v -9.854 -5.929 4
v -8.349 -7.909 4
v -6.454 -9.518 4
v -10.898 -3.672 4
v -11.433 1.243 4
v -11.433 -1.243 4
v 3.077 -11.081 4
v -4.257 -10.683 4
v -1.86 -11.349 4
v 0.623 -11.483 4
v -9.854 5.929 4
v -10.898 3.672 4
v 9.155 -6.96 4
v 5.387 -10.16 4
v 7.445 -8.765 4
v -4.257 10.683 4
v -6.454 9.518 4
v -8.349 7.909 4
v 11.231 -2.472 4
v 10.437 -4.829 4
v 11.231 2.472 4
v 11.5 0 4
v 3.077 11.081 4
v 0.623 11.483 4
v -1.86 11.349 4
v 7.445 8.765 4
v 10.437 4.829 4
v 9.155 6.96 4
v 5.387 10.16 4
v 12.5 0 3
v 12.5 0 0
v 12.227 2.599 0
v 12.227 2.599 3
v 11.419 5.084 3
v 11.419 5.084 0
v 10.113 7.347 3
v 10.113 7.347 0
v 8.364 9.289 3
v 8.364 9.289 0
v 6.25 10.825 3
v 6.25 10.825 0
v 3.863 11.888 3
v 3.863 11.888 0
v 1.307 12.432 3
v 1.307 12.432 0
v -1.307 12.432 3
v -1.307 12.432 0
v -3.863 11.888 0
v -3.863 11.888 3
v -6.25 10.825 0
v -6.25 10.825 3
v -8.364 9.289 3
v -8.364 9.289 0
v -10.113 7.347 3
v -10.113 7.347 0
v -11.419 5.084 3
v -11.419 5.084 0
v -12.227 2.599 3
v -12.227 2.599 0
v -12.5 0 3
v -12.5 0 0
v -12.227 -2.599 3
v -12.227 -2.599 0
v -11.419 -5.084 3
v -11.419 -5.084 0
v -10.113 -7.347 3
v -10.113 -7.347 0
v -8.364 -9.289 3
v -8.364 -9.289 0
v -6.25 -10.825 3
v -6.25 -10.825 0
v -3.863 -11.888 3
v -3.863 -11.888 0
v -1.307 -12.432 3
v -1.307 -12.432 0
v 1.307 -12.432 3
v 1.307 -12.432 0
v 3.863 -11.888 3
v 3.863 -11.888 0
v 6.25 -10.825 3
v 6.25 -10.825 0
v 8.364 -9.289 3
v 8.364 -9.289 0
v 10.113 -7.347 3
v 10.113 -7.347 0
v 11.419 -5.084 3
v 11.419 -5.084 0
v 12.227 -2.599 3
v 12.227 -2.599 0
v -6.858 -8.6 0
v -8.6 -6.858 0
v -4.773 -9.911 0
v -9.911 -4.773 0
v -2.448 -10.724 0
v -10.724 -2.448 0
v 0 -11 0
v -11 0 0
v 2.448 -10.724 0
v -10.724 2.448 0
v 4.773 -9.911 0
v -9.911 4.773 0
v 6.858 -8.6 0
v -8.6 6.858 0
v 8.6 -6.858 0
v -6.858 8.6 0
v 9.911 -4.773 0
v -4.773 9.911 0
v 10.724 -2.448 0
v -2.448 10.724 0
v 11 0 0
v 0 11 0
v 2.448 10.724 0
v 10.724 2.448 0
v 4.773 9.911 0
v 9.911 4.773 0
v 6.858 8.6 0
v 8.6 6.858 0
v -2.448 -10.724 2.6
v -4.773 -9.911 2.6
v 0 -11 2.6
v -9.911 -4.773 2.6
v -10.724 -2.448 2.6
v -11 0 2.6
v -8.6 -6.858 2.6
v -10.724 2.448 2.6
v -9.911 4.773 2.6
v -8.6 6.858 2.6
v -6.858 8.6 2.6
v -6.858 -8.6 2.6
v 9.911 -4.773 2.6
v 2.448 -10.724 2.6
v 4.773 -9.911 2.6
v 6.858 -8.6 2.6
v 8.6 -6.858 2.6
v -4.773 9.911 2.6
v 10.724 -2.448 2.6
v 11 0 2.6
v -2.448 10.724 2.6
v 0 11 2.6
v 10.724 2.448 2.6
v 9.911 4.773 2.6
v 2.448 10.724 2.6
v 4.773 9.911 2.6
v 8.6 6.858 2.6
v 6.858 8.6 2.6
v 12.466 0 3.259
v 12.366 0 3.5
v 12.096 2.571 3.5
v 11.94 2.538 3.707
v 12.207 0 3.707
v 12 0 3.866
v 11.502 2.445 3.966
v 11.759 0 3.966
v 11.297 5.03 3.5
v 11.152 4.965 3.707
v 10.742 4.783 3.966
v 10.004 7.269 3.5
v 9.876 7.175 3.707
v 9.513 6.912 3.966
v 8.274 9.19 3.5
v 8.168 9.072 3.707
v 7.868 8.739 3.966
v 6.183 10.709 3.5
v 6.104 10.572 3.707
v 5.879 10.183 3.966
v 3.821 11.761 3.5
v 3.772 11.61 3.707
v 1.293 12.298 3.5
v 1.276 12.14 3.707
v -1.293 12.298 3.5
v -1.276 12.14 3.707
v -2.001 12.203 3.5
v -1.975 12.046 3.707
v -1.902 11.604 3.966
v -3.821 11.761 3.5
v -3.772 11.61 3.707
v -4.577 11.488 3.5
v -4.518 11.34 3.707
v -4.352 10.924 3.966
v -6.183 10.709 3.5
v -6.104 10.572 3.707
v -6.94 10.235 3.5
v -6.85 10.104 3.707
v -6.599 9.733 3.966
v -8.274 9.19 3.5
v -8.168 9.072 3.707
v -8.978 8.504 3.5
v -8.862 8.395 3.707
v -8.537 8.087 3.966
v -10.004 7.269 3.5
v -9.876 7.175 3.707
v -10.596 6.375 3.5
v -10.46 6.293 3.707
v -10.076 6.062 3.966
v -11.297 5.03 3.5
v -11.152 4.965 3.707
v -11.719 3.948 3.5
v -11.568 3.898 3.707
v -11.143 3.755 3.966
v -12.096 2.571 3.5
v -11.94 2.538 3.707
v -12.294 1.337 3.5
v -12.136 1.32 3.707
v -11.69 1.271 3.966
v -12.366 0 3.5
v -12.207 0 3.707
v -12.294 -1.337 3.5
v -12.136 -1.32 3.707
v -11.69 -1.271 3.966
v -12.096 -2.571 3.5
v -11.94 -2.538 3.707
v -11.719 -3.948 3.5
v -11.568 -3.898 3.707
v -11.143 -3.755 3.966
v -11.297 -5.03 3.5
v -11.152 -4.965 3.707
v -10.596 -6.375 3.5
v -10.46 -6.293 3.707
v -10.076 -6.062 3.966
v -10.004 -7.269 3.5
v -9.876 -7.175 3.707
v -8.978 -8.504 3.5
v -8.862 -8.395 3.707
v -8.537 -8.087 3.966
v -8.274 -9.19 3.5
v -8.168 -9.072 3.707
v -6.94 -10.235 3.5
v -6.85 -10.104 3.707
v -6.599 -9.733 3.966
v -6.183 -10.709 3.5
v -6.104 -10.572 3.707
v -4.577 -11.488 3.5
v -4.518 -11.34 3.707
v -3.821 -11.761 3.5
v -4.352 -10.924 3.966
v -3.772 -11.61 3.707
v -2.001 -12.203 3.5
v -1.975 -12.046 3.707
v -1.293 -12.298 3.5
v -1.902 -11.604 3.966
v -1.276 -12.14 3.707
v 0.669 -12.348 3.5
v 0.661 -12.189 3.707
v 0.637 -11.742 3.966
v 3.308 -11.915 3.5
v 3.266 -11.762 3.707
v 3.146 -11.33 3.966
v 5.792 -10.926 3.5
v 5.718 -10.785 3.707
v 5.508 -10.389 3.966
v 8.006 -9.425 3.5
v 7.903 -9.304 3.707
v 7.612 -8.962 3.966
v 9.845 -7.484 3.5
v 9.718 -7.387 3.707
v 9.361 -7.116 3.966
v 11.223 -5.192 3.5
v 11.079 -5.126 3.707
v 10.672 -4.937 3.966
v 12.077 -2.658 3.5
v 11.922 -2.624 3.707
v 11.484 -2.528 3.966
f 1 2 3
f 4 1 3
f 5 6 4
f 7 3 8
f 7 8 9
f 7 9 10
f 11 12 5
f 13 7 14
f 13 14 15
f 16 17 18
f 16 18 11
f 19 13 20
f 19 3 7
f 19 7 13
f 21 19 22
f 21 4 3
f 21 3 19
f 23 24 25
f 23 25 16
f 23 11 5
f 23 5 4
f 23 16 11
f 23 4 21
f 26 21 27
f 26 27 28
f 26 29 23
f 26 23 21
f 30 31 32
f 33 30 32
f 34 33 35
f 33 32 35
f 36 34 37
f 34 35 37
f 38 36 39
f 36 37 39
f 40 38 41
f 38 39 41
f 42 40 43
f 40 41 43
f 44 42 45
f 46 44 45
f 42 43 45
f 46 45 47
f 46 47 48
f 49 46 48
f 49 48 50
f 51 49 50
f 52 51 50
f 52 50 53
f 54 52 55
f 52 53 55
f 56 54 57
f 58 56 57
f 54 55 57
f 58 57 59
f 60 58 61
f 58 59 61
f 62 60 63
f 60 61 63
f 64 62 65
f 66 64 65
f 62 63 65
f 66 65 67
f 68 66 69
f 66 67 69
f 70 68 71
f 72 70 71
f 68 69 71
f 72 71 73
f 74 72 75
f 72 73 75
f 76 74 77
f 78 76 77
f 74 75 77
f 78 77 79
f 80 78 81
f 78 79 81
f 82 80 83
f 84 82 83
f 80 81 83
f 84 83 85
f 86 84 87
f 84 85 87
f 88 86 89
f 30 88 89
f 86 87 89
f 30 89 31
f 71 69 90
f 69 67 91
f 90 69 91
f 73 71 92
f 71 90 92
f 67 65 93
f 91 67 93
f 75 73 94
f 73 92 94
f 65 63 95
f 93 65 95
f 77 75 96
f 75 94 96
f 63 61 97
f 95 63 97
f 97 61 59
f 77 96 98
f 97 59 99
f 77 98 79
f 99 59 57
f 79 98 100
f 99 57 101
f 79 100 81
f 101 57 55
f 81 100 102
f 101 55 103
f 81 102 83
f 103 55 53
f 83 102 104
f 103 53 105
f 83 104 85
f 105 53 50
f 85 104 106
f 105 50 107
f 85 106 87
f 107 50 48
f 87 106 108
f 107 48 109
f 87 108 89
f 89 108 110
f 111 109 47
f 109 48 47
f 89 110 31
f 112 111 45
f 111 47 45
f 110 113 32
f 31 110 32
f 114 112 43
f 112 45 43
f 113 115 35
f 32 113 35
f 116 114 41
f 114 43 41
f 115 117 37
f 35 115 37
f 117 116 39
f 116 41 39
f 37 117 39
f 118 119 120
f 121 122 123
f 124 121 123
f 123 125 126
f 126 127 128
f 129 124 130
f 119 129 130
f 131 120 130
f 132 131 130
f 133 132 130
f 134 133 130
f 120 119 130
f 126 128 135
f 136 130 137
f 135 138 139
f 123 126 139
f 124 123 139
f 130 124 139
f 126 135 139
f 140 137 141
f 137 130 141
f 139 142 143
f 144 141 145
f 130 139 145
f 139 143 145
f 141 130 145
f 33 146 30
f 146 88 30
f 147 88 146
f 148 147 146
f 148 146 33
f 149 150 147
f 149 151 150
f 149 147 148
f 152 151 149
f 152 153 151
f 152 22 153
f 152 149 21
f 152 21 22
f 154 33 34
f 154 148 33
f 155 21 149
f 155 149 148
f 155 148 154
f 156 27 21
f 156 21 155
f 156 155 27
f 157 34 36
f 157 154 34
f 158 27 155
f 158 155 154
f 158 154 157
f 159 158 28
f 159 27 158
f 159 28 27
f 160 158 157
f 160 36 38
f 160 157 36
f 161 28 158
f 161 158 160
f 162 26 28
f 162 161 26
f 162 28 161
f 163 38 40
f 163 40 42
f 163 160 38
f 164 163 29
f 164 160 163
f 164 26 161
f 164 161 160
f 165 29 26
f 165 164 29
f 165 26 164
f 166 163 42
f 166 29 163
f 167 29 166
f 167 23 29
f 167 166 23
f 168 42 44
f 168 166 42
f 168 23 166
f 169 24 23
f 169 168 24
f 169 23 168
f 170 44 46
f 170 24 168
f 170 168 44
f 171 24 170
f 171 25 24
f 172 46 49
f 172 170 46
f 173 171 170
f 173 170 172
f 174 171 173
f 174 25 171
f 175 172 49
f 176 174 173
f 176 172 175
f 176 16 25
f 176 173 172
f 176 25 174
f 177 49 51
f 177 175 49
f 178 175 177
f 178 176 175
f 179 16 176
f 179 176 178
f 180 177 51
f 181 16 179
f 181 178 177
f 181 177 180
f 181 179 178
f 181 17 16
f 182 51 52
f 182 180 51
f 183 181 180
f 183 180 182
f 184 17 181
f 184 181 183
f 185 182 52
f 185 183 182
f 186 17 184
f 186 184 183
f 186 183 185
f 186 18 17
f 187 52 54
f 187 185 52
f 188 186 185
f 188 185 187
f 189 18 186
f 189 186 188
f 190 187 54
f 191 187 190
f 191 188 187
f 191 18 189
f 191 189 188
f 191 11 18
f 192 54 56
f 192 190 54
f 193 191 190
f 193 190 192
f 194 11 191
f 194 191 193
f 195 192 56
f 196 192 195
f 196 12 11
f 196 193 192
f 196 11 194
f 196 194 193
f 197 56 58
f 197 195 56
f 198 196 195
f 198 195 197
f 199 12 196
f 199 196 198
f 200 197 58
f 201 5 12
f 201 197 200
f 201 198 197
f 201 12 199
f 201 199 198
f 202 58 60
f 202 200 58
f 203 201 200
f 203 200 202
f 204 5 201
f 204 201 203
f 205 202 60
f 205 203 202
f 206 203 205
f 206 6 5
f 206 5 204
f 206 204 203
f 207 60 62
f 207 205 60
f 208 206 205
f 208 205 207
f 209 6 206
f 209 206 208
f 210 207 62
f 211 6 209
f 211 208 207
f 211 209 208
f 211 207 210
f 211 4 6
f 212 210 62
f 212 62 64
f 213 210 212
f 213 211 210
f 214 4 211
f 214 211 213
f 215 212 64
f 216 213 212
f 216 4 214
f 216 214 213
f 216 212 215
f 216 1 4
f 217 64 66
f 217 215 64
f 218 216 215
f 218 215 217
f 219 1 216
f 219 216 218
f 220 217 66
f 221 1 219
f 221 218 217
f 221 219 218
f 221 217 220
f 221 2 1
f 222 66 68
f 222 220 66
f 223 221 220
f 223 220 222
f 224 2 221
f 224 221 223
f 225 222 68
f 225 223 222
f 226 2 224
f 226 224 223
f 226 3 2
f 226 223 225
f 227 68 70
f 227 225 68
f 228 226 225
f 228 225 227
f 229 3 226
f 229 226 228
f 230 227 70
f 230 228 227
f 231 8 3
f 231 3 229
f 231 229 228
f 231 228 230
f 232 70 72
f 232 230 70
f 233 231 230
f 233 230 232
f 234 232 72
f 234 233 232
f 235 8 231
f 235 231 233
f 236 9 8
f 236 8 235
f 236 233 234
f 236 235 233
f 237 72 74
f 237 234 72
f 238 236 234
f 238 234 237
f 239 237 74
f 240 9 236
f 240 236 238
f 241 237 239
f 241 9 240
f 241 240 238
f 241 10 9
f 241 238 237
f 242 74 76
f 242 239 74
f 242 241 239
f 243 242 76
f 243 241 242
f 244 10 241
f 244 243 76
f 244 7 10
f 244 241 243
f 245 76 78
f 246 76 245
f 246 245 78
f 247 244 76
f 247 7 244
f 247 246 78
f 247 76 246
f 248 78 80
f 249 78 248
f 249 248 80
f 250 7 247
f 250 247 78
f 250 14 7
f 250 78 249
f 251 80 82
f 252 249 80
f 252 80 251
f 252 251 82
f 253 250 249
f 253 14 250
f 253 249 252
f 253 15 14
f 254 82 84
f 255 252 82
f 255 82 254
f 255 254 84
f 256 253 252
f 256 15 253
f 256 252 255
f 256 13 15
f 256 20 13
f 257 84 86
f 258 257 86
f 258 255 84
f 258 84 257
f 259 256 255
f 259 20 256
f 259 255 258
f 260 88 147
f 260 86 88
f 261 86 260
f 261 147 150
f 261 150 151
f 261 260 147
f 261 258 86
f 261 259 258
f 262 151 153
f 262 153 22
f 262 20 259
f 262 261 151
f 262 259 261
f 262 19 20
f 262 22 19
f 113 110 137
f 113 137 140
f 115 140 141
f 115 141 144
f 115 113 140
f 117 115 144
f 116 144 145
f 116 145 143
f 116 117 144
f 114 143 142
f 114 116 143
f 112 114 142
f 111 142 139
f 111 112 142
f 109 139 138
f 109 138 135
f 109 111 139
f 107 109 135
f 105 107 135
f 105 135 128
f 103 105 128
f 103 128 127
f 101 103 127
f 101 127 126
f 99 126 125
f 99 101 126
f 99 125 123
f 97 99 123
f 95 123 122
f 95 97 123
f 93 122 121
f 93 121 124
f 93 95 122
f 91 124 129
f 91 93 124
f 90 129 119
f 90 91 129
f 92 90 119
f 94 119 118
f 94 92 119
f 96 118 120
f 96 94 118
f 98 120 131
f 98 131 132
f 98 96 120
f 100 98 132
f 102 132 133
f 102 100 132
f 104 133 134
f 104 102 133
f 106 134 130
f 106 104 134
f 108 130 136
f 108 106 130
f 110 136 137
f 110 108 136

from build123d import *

# Parameters (mm, degrees)
F0_R     = 12.5
F0_R_2   = 11
F1_DEPTH = 4
F2_DEPTH = 2.6
F3_R     = 1


with BuildPart() as f1:
    # F0 (on Top) → F1 (new body)
    with BuildSketch(Plane.XY):
        Circle(F0_R)
        Circle(F0_R_2, mode=Mode.SUBTRACT)
        Circle(F0_R_2)
    extrude(amount=F1_DEPTH)

    # F0 (on Top) → F2 (cut)
    with BuildSketch(Plane.XY):
        Circle(F0_R_2)
    extrude(amount=F2_DEPTH, mode=Mode.SUBTRACT)

    # F3
    f3_edges = [f1.edges().sort_by_distance(p)[0] for p in [
        (-12.5, 0, 4),
    ]]
    fillet(f3_edges, radius=F3_R)


solid = f1.part
